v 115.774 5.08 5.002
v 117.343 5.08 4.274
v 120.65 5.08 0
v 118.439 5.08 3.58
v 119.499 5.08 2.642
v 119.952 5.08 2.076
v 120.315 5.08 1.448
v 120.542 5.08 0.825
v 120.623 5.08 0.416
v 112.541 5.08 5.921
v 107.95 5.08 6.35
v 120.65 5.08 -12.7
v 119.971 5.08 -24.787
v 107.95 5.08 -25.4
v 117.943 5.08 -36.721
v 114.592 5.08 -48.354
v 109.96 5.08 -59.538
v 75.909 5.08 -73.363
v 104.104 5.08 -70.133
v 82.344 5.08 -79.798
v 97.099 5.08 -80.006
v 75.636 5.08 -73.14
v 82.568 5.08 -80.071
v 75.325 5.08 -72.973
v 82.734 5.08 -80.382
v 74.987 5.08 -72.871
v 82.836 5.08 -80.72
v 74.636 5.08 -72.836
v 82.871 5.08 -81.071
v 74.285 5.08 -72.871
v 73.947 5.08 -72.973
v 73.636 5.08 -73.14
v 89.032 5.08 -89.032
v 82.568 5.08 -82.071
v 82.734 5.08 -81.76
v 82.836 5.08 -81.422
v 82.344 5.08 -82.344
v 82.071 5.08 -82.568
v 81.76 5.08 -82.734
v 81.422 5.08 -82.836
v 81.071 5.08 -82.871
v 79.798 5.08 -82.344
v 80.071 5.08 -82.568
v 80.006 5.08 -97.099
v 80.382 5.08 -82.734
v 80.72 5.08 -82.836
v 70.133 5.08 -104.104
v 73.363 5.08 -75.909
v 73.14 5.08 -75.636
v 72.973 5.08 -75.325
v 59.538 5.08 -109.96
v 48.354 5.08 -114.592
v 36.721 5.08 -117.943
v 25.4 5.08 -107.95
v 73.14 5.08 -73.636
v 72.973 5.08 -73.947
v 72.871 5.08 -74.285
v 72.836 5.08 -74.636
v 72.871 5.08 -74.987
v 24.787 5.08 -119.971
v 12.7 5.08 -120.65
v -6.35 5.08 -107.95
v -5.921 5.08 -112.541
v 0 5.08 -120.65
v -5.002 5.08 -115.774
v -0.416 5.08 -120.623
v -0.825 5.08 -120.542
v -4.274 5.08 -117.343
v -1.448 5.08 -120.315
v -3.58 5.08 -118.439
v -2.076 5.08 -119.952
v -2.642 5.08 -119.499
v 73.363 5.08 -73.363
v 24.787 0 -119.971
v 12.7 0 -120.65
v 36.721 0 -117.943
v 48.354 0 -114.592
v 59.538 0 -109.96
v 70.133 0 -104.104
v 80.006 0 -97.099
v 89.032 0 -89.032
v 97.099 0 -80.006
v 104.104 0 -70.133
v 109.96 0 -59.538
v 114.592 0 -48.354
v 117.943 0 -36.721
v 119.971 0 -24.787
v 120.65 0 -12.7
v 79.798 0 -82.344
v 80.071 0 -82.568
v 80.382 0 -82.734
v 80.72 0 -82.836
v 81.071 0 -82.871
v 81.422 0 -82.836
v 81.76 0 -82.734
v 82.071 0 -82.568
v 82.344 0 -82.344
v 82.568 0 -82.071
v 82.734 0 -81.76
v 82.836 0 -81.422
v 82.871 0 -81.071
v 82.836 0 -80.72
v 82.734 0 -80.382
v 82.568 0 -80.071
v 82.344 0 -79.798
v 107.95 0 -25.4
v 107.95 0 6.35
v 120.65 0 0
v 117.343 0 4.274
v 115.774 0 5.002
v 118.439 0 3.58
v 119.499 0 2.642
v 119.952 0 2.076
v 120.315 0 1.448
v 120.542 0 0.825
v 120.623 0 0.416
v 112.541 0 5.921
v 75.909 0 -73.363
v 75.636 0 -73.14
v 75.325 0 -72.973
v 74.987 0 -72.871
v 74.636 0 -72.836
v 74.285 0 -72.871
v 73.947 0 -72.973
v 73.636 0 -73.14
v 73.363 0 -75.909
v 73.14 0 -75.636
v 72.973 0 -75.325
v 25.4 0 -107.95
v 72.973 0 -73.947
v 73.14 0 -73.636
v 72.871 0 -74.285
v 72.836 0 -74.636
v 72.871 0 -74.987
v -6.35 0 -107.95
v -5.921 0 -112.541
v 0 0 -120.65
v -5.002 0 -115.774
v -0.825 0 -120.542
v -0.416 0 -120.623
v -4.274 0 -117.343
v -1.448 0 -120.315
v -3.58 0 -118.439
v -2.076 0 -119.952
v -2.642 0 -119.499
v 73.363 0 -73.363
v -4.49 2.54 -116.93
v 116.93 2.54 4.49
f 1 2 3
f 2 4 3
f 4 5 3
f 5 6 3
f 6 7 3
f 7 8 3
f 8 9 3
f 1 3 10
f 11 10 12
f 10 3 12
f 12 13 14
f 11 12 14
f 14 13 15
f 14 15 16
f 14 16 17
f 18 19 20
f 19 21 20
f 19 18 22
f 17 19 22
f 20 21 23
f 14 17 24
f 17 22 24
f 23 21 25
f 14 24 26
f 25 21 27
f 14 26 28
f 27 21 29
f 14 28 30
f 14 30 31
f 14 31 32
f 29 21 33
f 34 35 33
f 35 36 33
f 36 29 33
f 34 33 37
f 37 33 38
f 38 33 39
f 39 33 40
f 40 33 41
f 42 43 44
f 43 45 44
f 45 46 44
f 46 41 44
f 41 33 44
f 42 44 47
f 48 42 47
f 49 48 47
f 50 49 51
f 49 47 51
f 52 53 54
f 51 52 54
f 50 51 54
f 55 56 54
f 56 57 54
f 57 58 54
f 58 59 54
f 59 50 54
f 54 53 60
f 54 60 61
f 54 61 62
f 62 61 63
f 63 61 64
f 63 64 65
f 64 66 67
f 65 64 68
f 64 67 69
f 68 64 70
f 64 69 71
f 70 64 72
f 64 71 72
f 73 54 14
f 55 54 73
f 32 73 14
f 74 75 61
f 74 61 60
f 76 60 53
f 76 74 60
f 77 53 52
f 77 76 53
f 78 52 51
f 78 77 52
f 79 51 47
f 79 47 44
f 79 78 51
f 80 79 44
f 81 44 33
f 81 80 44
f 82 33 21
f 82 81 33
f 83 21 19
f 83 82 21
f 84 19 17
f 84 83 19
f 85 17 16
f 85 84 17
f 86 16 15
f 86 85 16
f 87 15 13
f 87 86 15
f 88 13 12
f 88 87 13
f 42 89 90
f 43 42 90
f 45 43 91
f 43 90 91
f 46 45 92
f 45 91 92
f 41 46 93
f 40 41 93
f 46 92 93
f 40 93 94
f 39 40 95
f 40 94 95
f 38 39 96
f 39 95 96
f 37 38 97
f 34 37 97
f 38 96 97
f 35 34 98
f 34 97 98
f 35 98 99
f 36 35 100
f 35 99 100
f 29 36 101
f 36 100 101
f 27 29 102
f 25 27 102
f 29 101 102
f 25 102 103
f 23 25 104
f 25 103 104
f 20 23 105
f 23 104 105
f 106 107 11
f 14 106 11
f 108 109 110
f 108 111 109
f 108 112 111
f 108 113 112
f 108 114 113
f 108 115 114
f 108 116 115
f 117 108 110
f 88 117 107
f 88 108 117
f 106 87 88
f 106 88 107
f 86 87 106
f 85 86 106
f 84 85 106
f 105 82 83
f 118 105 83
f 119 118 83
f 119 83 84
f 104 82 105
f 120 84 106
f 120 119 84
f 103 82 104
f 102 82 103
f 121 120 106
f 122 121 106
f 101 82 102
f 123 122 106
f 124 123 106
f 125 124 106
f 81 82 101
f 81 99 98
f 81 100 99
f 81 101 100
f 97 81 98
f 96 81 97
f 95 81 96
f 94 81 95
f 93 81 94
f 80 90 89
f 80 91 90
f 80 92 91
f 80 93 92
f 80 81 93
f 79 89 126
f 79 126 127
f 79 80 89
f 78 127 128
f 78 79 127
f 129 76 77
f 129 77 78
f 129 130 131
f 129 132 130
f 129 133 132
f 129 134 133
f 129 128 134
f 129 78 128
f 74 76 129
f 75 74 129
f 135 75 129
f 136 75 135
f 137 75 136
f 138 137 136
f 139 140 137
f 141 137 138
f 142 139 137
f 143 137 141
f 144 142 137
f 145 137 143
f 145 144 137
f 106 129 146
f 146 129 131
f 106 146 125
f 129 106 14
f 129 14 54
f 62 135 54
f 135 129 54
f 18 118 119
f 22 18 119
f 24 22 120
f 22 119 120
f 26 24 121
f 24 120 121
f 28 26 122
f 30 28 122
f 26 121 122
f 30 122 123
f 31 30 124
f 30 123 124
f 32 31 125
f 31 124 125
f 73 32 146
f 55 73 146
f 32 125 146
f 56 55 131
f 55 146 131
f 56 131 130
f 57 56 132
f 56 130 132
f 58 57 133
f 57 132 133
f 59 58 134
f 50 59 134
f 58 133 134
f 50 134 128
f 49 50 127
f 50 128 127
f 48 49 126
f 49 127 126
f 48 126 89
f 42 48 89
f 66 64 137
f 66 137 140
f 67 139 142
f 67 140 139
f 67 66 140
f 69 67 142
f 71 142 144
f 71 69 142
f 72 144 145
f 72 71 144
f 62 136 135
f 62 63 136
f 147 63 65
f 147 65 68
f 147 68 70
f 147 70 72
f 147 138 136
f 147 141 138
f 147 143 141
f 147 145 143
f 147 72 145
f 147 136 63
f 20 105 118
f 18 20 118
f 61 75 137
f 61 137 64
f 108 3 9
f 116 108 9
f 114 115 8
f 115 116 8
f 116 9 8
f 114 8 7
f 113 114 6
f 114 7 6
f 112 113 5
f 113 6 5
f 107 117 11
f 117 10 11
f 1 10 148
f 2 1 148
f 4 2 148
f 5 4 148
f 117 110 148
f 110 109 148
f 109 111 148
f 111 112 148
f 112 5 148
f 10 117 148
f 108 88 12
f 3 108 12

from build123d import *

# Parameters (mm, degrees)
BOSS_EXTRUDE1_DEPTH = 5.08
SKETCH2_W           = 12.7
SKETCH2_H           = 5.08
BOSS_EXTRUDE2_DEPTH = 6.35
FILLET3_SIZE        = 6.35
FILLET3_SIZE_2      = 12.7
FILLET4_SIZE        = 6.35
FILLET4_SIZE_2      = 12.7


with BuildPart() as part:
    # Sketch1 → Boss-Extrude1 (new body)
    with BuildSketch(Plane(origin=(0, 0, 0), x_dir=(1, 0, 0), z_dir=(0, 1, 0))):
        with BuildLine():
            Line((0, 120.65), (12.7, 120.65))
            ThreePointArc((12.7, 120.65), (89.032177029, 89.032177029), (120.65, 12.7))
            Line((120.65, 12.7), (120.65, 0))
            Line((120.65, 0), (107.95, 0))
            Line((107.95, 0), (107.95, 25.4))
            Line((107.95, 25.4), (25.4, 107.95))
            Line((25.4, 107.95), (0, 107.95))
            Line((0, 107.95), (0, 120.65))
        make_face()
        with BuildLine():
            Line((73.363460454, 75.909044866), (79.798132163, 82.343716575))
            ThreePointArc((79.798132163, 82.343716575), (82.343716575, 82.343716575), (82.343716575, 79.798132163))
            Line((82.343716575, 79.798132163), (75.909044866, 73.363460454))
            ThreePointArc((75.909044866, 73.363460454), (73.363460454, 73.363460454), (73.363460454, 75.909044866))
        make_face(mode=Mode.SUBTRACT)
    extrude(amount=BOSS_EXTRUDE1_DEPTH)

    # Sketch2 → Boss-Extrude2 (add)
    with BuildSketch(Plane.ZY):
        with Locations((-114.3, 2.54)):
            Rectangle(SKETCH2_W, SKETCH2_H)
    boss_extrude2 = extrude(amount=BOSS_EXTRUDE2_DEPTH)

    # Mirror2: Boss-Extrude2 across plane
    add(boss_extrude2.mirror(Plane(origin=(0, 0, 0), x_dir=(-0.7071067811865479, 0, 0.7071067811865471), z_dir=(0.7071067811865471, 0, 0.7071067811865479))))

    # Fillet3
    # an asymmetric fillet: 12.7, 6.35 mm, written as the material it takes off along each edge
    with BuildSketch(Plane(origin=(-6.35, 36.83, -120.65), x_dir=(1, 0, 0), z_dir=(0, -1, 0))) as fillet3_piece_1:
        with BuildLine():
            Bezier((FILLET3_SIZE, 0), (0, 0), (0, FILLET3_SIZE_2), weights=[1, 0.707106781, 1])
            Line((0, FILLET3_SIZE_2), (0, 0))
            Line((0, 0), (FILLET3_SIZE, 0))
        make_face()
    extrude(amount=68.58, mode=Mode.SUBTRACT)

    # Fillet4
    # an asymmetric fillet: 12.7, 6.35 mm, written as the material it takes off along each edge
    with BuildSketch(Plane(origin=(120.65, 36.83, 6.35), x_dir=(0, 0, -1), z_dir=(0, -1, 0))) as fillet4_piece_1:
        with BuildLine():
            Bezier((FILLET4_SIZE, 0), (0, 0), (0, -FILLET4_SIZE_2), weights=[1, 0.707106781, 1])
            Line((0, -FILLET4_SIZE_2), (0, 0))
            Line((0, 0), (FILLET4_SIZE, 0))
        make_face()
    extrude(amount=68.58, mode=Mode.SUBTRACT)


solid = part.part
